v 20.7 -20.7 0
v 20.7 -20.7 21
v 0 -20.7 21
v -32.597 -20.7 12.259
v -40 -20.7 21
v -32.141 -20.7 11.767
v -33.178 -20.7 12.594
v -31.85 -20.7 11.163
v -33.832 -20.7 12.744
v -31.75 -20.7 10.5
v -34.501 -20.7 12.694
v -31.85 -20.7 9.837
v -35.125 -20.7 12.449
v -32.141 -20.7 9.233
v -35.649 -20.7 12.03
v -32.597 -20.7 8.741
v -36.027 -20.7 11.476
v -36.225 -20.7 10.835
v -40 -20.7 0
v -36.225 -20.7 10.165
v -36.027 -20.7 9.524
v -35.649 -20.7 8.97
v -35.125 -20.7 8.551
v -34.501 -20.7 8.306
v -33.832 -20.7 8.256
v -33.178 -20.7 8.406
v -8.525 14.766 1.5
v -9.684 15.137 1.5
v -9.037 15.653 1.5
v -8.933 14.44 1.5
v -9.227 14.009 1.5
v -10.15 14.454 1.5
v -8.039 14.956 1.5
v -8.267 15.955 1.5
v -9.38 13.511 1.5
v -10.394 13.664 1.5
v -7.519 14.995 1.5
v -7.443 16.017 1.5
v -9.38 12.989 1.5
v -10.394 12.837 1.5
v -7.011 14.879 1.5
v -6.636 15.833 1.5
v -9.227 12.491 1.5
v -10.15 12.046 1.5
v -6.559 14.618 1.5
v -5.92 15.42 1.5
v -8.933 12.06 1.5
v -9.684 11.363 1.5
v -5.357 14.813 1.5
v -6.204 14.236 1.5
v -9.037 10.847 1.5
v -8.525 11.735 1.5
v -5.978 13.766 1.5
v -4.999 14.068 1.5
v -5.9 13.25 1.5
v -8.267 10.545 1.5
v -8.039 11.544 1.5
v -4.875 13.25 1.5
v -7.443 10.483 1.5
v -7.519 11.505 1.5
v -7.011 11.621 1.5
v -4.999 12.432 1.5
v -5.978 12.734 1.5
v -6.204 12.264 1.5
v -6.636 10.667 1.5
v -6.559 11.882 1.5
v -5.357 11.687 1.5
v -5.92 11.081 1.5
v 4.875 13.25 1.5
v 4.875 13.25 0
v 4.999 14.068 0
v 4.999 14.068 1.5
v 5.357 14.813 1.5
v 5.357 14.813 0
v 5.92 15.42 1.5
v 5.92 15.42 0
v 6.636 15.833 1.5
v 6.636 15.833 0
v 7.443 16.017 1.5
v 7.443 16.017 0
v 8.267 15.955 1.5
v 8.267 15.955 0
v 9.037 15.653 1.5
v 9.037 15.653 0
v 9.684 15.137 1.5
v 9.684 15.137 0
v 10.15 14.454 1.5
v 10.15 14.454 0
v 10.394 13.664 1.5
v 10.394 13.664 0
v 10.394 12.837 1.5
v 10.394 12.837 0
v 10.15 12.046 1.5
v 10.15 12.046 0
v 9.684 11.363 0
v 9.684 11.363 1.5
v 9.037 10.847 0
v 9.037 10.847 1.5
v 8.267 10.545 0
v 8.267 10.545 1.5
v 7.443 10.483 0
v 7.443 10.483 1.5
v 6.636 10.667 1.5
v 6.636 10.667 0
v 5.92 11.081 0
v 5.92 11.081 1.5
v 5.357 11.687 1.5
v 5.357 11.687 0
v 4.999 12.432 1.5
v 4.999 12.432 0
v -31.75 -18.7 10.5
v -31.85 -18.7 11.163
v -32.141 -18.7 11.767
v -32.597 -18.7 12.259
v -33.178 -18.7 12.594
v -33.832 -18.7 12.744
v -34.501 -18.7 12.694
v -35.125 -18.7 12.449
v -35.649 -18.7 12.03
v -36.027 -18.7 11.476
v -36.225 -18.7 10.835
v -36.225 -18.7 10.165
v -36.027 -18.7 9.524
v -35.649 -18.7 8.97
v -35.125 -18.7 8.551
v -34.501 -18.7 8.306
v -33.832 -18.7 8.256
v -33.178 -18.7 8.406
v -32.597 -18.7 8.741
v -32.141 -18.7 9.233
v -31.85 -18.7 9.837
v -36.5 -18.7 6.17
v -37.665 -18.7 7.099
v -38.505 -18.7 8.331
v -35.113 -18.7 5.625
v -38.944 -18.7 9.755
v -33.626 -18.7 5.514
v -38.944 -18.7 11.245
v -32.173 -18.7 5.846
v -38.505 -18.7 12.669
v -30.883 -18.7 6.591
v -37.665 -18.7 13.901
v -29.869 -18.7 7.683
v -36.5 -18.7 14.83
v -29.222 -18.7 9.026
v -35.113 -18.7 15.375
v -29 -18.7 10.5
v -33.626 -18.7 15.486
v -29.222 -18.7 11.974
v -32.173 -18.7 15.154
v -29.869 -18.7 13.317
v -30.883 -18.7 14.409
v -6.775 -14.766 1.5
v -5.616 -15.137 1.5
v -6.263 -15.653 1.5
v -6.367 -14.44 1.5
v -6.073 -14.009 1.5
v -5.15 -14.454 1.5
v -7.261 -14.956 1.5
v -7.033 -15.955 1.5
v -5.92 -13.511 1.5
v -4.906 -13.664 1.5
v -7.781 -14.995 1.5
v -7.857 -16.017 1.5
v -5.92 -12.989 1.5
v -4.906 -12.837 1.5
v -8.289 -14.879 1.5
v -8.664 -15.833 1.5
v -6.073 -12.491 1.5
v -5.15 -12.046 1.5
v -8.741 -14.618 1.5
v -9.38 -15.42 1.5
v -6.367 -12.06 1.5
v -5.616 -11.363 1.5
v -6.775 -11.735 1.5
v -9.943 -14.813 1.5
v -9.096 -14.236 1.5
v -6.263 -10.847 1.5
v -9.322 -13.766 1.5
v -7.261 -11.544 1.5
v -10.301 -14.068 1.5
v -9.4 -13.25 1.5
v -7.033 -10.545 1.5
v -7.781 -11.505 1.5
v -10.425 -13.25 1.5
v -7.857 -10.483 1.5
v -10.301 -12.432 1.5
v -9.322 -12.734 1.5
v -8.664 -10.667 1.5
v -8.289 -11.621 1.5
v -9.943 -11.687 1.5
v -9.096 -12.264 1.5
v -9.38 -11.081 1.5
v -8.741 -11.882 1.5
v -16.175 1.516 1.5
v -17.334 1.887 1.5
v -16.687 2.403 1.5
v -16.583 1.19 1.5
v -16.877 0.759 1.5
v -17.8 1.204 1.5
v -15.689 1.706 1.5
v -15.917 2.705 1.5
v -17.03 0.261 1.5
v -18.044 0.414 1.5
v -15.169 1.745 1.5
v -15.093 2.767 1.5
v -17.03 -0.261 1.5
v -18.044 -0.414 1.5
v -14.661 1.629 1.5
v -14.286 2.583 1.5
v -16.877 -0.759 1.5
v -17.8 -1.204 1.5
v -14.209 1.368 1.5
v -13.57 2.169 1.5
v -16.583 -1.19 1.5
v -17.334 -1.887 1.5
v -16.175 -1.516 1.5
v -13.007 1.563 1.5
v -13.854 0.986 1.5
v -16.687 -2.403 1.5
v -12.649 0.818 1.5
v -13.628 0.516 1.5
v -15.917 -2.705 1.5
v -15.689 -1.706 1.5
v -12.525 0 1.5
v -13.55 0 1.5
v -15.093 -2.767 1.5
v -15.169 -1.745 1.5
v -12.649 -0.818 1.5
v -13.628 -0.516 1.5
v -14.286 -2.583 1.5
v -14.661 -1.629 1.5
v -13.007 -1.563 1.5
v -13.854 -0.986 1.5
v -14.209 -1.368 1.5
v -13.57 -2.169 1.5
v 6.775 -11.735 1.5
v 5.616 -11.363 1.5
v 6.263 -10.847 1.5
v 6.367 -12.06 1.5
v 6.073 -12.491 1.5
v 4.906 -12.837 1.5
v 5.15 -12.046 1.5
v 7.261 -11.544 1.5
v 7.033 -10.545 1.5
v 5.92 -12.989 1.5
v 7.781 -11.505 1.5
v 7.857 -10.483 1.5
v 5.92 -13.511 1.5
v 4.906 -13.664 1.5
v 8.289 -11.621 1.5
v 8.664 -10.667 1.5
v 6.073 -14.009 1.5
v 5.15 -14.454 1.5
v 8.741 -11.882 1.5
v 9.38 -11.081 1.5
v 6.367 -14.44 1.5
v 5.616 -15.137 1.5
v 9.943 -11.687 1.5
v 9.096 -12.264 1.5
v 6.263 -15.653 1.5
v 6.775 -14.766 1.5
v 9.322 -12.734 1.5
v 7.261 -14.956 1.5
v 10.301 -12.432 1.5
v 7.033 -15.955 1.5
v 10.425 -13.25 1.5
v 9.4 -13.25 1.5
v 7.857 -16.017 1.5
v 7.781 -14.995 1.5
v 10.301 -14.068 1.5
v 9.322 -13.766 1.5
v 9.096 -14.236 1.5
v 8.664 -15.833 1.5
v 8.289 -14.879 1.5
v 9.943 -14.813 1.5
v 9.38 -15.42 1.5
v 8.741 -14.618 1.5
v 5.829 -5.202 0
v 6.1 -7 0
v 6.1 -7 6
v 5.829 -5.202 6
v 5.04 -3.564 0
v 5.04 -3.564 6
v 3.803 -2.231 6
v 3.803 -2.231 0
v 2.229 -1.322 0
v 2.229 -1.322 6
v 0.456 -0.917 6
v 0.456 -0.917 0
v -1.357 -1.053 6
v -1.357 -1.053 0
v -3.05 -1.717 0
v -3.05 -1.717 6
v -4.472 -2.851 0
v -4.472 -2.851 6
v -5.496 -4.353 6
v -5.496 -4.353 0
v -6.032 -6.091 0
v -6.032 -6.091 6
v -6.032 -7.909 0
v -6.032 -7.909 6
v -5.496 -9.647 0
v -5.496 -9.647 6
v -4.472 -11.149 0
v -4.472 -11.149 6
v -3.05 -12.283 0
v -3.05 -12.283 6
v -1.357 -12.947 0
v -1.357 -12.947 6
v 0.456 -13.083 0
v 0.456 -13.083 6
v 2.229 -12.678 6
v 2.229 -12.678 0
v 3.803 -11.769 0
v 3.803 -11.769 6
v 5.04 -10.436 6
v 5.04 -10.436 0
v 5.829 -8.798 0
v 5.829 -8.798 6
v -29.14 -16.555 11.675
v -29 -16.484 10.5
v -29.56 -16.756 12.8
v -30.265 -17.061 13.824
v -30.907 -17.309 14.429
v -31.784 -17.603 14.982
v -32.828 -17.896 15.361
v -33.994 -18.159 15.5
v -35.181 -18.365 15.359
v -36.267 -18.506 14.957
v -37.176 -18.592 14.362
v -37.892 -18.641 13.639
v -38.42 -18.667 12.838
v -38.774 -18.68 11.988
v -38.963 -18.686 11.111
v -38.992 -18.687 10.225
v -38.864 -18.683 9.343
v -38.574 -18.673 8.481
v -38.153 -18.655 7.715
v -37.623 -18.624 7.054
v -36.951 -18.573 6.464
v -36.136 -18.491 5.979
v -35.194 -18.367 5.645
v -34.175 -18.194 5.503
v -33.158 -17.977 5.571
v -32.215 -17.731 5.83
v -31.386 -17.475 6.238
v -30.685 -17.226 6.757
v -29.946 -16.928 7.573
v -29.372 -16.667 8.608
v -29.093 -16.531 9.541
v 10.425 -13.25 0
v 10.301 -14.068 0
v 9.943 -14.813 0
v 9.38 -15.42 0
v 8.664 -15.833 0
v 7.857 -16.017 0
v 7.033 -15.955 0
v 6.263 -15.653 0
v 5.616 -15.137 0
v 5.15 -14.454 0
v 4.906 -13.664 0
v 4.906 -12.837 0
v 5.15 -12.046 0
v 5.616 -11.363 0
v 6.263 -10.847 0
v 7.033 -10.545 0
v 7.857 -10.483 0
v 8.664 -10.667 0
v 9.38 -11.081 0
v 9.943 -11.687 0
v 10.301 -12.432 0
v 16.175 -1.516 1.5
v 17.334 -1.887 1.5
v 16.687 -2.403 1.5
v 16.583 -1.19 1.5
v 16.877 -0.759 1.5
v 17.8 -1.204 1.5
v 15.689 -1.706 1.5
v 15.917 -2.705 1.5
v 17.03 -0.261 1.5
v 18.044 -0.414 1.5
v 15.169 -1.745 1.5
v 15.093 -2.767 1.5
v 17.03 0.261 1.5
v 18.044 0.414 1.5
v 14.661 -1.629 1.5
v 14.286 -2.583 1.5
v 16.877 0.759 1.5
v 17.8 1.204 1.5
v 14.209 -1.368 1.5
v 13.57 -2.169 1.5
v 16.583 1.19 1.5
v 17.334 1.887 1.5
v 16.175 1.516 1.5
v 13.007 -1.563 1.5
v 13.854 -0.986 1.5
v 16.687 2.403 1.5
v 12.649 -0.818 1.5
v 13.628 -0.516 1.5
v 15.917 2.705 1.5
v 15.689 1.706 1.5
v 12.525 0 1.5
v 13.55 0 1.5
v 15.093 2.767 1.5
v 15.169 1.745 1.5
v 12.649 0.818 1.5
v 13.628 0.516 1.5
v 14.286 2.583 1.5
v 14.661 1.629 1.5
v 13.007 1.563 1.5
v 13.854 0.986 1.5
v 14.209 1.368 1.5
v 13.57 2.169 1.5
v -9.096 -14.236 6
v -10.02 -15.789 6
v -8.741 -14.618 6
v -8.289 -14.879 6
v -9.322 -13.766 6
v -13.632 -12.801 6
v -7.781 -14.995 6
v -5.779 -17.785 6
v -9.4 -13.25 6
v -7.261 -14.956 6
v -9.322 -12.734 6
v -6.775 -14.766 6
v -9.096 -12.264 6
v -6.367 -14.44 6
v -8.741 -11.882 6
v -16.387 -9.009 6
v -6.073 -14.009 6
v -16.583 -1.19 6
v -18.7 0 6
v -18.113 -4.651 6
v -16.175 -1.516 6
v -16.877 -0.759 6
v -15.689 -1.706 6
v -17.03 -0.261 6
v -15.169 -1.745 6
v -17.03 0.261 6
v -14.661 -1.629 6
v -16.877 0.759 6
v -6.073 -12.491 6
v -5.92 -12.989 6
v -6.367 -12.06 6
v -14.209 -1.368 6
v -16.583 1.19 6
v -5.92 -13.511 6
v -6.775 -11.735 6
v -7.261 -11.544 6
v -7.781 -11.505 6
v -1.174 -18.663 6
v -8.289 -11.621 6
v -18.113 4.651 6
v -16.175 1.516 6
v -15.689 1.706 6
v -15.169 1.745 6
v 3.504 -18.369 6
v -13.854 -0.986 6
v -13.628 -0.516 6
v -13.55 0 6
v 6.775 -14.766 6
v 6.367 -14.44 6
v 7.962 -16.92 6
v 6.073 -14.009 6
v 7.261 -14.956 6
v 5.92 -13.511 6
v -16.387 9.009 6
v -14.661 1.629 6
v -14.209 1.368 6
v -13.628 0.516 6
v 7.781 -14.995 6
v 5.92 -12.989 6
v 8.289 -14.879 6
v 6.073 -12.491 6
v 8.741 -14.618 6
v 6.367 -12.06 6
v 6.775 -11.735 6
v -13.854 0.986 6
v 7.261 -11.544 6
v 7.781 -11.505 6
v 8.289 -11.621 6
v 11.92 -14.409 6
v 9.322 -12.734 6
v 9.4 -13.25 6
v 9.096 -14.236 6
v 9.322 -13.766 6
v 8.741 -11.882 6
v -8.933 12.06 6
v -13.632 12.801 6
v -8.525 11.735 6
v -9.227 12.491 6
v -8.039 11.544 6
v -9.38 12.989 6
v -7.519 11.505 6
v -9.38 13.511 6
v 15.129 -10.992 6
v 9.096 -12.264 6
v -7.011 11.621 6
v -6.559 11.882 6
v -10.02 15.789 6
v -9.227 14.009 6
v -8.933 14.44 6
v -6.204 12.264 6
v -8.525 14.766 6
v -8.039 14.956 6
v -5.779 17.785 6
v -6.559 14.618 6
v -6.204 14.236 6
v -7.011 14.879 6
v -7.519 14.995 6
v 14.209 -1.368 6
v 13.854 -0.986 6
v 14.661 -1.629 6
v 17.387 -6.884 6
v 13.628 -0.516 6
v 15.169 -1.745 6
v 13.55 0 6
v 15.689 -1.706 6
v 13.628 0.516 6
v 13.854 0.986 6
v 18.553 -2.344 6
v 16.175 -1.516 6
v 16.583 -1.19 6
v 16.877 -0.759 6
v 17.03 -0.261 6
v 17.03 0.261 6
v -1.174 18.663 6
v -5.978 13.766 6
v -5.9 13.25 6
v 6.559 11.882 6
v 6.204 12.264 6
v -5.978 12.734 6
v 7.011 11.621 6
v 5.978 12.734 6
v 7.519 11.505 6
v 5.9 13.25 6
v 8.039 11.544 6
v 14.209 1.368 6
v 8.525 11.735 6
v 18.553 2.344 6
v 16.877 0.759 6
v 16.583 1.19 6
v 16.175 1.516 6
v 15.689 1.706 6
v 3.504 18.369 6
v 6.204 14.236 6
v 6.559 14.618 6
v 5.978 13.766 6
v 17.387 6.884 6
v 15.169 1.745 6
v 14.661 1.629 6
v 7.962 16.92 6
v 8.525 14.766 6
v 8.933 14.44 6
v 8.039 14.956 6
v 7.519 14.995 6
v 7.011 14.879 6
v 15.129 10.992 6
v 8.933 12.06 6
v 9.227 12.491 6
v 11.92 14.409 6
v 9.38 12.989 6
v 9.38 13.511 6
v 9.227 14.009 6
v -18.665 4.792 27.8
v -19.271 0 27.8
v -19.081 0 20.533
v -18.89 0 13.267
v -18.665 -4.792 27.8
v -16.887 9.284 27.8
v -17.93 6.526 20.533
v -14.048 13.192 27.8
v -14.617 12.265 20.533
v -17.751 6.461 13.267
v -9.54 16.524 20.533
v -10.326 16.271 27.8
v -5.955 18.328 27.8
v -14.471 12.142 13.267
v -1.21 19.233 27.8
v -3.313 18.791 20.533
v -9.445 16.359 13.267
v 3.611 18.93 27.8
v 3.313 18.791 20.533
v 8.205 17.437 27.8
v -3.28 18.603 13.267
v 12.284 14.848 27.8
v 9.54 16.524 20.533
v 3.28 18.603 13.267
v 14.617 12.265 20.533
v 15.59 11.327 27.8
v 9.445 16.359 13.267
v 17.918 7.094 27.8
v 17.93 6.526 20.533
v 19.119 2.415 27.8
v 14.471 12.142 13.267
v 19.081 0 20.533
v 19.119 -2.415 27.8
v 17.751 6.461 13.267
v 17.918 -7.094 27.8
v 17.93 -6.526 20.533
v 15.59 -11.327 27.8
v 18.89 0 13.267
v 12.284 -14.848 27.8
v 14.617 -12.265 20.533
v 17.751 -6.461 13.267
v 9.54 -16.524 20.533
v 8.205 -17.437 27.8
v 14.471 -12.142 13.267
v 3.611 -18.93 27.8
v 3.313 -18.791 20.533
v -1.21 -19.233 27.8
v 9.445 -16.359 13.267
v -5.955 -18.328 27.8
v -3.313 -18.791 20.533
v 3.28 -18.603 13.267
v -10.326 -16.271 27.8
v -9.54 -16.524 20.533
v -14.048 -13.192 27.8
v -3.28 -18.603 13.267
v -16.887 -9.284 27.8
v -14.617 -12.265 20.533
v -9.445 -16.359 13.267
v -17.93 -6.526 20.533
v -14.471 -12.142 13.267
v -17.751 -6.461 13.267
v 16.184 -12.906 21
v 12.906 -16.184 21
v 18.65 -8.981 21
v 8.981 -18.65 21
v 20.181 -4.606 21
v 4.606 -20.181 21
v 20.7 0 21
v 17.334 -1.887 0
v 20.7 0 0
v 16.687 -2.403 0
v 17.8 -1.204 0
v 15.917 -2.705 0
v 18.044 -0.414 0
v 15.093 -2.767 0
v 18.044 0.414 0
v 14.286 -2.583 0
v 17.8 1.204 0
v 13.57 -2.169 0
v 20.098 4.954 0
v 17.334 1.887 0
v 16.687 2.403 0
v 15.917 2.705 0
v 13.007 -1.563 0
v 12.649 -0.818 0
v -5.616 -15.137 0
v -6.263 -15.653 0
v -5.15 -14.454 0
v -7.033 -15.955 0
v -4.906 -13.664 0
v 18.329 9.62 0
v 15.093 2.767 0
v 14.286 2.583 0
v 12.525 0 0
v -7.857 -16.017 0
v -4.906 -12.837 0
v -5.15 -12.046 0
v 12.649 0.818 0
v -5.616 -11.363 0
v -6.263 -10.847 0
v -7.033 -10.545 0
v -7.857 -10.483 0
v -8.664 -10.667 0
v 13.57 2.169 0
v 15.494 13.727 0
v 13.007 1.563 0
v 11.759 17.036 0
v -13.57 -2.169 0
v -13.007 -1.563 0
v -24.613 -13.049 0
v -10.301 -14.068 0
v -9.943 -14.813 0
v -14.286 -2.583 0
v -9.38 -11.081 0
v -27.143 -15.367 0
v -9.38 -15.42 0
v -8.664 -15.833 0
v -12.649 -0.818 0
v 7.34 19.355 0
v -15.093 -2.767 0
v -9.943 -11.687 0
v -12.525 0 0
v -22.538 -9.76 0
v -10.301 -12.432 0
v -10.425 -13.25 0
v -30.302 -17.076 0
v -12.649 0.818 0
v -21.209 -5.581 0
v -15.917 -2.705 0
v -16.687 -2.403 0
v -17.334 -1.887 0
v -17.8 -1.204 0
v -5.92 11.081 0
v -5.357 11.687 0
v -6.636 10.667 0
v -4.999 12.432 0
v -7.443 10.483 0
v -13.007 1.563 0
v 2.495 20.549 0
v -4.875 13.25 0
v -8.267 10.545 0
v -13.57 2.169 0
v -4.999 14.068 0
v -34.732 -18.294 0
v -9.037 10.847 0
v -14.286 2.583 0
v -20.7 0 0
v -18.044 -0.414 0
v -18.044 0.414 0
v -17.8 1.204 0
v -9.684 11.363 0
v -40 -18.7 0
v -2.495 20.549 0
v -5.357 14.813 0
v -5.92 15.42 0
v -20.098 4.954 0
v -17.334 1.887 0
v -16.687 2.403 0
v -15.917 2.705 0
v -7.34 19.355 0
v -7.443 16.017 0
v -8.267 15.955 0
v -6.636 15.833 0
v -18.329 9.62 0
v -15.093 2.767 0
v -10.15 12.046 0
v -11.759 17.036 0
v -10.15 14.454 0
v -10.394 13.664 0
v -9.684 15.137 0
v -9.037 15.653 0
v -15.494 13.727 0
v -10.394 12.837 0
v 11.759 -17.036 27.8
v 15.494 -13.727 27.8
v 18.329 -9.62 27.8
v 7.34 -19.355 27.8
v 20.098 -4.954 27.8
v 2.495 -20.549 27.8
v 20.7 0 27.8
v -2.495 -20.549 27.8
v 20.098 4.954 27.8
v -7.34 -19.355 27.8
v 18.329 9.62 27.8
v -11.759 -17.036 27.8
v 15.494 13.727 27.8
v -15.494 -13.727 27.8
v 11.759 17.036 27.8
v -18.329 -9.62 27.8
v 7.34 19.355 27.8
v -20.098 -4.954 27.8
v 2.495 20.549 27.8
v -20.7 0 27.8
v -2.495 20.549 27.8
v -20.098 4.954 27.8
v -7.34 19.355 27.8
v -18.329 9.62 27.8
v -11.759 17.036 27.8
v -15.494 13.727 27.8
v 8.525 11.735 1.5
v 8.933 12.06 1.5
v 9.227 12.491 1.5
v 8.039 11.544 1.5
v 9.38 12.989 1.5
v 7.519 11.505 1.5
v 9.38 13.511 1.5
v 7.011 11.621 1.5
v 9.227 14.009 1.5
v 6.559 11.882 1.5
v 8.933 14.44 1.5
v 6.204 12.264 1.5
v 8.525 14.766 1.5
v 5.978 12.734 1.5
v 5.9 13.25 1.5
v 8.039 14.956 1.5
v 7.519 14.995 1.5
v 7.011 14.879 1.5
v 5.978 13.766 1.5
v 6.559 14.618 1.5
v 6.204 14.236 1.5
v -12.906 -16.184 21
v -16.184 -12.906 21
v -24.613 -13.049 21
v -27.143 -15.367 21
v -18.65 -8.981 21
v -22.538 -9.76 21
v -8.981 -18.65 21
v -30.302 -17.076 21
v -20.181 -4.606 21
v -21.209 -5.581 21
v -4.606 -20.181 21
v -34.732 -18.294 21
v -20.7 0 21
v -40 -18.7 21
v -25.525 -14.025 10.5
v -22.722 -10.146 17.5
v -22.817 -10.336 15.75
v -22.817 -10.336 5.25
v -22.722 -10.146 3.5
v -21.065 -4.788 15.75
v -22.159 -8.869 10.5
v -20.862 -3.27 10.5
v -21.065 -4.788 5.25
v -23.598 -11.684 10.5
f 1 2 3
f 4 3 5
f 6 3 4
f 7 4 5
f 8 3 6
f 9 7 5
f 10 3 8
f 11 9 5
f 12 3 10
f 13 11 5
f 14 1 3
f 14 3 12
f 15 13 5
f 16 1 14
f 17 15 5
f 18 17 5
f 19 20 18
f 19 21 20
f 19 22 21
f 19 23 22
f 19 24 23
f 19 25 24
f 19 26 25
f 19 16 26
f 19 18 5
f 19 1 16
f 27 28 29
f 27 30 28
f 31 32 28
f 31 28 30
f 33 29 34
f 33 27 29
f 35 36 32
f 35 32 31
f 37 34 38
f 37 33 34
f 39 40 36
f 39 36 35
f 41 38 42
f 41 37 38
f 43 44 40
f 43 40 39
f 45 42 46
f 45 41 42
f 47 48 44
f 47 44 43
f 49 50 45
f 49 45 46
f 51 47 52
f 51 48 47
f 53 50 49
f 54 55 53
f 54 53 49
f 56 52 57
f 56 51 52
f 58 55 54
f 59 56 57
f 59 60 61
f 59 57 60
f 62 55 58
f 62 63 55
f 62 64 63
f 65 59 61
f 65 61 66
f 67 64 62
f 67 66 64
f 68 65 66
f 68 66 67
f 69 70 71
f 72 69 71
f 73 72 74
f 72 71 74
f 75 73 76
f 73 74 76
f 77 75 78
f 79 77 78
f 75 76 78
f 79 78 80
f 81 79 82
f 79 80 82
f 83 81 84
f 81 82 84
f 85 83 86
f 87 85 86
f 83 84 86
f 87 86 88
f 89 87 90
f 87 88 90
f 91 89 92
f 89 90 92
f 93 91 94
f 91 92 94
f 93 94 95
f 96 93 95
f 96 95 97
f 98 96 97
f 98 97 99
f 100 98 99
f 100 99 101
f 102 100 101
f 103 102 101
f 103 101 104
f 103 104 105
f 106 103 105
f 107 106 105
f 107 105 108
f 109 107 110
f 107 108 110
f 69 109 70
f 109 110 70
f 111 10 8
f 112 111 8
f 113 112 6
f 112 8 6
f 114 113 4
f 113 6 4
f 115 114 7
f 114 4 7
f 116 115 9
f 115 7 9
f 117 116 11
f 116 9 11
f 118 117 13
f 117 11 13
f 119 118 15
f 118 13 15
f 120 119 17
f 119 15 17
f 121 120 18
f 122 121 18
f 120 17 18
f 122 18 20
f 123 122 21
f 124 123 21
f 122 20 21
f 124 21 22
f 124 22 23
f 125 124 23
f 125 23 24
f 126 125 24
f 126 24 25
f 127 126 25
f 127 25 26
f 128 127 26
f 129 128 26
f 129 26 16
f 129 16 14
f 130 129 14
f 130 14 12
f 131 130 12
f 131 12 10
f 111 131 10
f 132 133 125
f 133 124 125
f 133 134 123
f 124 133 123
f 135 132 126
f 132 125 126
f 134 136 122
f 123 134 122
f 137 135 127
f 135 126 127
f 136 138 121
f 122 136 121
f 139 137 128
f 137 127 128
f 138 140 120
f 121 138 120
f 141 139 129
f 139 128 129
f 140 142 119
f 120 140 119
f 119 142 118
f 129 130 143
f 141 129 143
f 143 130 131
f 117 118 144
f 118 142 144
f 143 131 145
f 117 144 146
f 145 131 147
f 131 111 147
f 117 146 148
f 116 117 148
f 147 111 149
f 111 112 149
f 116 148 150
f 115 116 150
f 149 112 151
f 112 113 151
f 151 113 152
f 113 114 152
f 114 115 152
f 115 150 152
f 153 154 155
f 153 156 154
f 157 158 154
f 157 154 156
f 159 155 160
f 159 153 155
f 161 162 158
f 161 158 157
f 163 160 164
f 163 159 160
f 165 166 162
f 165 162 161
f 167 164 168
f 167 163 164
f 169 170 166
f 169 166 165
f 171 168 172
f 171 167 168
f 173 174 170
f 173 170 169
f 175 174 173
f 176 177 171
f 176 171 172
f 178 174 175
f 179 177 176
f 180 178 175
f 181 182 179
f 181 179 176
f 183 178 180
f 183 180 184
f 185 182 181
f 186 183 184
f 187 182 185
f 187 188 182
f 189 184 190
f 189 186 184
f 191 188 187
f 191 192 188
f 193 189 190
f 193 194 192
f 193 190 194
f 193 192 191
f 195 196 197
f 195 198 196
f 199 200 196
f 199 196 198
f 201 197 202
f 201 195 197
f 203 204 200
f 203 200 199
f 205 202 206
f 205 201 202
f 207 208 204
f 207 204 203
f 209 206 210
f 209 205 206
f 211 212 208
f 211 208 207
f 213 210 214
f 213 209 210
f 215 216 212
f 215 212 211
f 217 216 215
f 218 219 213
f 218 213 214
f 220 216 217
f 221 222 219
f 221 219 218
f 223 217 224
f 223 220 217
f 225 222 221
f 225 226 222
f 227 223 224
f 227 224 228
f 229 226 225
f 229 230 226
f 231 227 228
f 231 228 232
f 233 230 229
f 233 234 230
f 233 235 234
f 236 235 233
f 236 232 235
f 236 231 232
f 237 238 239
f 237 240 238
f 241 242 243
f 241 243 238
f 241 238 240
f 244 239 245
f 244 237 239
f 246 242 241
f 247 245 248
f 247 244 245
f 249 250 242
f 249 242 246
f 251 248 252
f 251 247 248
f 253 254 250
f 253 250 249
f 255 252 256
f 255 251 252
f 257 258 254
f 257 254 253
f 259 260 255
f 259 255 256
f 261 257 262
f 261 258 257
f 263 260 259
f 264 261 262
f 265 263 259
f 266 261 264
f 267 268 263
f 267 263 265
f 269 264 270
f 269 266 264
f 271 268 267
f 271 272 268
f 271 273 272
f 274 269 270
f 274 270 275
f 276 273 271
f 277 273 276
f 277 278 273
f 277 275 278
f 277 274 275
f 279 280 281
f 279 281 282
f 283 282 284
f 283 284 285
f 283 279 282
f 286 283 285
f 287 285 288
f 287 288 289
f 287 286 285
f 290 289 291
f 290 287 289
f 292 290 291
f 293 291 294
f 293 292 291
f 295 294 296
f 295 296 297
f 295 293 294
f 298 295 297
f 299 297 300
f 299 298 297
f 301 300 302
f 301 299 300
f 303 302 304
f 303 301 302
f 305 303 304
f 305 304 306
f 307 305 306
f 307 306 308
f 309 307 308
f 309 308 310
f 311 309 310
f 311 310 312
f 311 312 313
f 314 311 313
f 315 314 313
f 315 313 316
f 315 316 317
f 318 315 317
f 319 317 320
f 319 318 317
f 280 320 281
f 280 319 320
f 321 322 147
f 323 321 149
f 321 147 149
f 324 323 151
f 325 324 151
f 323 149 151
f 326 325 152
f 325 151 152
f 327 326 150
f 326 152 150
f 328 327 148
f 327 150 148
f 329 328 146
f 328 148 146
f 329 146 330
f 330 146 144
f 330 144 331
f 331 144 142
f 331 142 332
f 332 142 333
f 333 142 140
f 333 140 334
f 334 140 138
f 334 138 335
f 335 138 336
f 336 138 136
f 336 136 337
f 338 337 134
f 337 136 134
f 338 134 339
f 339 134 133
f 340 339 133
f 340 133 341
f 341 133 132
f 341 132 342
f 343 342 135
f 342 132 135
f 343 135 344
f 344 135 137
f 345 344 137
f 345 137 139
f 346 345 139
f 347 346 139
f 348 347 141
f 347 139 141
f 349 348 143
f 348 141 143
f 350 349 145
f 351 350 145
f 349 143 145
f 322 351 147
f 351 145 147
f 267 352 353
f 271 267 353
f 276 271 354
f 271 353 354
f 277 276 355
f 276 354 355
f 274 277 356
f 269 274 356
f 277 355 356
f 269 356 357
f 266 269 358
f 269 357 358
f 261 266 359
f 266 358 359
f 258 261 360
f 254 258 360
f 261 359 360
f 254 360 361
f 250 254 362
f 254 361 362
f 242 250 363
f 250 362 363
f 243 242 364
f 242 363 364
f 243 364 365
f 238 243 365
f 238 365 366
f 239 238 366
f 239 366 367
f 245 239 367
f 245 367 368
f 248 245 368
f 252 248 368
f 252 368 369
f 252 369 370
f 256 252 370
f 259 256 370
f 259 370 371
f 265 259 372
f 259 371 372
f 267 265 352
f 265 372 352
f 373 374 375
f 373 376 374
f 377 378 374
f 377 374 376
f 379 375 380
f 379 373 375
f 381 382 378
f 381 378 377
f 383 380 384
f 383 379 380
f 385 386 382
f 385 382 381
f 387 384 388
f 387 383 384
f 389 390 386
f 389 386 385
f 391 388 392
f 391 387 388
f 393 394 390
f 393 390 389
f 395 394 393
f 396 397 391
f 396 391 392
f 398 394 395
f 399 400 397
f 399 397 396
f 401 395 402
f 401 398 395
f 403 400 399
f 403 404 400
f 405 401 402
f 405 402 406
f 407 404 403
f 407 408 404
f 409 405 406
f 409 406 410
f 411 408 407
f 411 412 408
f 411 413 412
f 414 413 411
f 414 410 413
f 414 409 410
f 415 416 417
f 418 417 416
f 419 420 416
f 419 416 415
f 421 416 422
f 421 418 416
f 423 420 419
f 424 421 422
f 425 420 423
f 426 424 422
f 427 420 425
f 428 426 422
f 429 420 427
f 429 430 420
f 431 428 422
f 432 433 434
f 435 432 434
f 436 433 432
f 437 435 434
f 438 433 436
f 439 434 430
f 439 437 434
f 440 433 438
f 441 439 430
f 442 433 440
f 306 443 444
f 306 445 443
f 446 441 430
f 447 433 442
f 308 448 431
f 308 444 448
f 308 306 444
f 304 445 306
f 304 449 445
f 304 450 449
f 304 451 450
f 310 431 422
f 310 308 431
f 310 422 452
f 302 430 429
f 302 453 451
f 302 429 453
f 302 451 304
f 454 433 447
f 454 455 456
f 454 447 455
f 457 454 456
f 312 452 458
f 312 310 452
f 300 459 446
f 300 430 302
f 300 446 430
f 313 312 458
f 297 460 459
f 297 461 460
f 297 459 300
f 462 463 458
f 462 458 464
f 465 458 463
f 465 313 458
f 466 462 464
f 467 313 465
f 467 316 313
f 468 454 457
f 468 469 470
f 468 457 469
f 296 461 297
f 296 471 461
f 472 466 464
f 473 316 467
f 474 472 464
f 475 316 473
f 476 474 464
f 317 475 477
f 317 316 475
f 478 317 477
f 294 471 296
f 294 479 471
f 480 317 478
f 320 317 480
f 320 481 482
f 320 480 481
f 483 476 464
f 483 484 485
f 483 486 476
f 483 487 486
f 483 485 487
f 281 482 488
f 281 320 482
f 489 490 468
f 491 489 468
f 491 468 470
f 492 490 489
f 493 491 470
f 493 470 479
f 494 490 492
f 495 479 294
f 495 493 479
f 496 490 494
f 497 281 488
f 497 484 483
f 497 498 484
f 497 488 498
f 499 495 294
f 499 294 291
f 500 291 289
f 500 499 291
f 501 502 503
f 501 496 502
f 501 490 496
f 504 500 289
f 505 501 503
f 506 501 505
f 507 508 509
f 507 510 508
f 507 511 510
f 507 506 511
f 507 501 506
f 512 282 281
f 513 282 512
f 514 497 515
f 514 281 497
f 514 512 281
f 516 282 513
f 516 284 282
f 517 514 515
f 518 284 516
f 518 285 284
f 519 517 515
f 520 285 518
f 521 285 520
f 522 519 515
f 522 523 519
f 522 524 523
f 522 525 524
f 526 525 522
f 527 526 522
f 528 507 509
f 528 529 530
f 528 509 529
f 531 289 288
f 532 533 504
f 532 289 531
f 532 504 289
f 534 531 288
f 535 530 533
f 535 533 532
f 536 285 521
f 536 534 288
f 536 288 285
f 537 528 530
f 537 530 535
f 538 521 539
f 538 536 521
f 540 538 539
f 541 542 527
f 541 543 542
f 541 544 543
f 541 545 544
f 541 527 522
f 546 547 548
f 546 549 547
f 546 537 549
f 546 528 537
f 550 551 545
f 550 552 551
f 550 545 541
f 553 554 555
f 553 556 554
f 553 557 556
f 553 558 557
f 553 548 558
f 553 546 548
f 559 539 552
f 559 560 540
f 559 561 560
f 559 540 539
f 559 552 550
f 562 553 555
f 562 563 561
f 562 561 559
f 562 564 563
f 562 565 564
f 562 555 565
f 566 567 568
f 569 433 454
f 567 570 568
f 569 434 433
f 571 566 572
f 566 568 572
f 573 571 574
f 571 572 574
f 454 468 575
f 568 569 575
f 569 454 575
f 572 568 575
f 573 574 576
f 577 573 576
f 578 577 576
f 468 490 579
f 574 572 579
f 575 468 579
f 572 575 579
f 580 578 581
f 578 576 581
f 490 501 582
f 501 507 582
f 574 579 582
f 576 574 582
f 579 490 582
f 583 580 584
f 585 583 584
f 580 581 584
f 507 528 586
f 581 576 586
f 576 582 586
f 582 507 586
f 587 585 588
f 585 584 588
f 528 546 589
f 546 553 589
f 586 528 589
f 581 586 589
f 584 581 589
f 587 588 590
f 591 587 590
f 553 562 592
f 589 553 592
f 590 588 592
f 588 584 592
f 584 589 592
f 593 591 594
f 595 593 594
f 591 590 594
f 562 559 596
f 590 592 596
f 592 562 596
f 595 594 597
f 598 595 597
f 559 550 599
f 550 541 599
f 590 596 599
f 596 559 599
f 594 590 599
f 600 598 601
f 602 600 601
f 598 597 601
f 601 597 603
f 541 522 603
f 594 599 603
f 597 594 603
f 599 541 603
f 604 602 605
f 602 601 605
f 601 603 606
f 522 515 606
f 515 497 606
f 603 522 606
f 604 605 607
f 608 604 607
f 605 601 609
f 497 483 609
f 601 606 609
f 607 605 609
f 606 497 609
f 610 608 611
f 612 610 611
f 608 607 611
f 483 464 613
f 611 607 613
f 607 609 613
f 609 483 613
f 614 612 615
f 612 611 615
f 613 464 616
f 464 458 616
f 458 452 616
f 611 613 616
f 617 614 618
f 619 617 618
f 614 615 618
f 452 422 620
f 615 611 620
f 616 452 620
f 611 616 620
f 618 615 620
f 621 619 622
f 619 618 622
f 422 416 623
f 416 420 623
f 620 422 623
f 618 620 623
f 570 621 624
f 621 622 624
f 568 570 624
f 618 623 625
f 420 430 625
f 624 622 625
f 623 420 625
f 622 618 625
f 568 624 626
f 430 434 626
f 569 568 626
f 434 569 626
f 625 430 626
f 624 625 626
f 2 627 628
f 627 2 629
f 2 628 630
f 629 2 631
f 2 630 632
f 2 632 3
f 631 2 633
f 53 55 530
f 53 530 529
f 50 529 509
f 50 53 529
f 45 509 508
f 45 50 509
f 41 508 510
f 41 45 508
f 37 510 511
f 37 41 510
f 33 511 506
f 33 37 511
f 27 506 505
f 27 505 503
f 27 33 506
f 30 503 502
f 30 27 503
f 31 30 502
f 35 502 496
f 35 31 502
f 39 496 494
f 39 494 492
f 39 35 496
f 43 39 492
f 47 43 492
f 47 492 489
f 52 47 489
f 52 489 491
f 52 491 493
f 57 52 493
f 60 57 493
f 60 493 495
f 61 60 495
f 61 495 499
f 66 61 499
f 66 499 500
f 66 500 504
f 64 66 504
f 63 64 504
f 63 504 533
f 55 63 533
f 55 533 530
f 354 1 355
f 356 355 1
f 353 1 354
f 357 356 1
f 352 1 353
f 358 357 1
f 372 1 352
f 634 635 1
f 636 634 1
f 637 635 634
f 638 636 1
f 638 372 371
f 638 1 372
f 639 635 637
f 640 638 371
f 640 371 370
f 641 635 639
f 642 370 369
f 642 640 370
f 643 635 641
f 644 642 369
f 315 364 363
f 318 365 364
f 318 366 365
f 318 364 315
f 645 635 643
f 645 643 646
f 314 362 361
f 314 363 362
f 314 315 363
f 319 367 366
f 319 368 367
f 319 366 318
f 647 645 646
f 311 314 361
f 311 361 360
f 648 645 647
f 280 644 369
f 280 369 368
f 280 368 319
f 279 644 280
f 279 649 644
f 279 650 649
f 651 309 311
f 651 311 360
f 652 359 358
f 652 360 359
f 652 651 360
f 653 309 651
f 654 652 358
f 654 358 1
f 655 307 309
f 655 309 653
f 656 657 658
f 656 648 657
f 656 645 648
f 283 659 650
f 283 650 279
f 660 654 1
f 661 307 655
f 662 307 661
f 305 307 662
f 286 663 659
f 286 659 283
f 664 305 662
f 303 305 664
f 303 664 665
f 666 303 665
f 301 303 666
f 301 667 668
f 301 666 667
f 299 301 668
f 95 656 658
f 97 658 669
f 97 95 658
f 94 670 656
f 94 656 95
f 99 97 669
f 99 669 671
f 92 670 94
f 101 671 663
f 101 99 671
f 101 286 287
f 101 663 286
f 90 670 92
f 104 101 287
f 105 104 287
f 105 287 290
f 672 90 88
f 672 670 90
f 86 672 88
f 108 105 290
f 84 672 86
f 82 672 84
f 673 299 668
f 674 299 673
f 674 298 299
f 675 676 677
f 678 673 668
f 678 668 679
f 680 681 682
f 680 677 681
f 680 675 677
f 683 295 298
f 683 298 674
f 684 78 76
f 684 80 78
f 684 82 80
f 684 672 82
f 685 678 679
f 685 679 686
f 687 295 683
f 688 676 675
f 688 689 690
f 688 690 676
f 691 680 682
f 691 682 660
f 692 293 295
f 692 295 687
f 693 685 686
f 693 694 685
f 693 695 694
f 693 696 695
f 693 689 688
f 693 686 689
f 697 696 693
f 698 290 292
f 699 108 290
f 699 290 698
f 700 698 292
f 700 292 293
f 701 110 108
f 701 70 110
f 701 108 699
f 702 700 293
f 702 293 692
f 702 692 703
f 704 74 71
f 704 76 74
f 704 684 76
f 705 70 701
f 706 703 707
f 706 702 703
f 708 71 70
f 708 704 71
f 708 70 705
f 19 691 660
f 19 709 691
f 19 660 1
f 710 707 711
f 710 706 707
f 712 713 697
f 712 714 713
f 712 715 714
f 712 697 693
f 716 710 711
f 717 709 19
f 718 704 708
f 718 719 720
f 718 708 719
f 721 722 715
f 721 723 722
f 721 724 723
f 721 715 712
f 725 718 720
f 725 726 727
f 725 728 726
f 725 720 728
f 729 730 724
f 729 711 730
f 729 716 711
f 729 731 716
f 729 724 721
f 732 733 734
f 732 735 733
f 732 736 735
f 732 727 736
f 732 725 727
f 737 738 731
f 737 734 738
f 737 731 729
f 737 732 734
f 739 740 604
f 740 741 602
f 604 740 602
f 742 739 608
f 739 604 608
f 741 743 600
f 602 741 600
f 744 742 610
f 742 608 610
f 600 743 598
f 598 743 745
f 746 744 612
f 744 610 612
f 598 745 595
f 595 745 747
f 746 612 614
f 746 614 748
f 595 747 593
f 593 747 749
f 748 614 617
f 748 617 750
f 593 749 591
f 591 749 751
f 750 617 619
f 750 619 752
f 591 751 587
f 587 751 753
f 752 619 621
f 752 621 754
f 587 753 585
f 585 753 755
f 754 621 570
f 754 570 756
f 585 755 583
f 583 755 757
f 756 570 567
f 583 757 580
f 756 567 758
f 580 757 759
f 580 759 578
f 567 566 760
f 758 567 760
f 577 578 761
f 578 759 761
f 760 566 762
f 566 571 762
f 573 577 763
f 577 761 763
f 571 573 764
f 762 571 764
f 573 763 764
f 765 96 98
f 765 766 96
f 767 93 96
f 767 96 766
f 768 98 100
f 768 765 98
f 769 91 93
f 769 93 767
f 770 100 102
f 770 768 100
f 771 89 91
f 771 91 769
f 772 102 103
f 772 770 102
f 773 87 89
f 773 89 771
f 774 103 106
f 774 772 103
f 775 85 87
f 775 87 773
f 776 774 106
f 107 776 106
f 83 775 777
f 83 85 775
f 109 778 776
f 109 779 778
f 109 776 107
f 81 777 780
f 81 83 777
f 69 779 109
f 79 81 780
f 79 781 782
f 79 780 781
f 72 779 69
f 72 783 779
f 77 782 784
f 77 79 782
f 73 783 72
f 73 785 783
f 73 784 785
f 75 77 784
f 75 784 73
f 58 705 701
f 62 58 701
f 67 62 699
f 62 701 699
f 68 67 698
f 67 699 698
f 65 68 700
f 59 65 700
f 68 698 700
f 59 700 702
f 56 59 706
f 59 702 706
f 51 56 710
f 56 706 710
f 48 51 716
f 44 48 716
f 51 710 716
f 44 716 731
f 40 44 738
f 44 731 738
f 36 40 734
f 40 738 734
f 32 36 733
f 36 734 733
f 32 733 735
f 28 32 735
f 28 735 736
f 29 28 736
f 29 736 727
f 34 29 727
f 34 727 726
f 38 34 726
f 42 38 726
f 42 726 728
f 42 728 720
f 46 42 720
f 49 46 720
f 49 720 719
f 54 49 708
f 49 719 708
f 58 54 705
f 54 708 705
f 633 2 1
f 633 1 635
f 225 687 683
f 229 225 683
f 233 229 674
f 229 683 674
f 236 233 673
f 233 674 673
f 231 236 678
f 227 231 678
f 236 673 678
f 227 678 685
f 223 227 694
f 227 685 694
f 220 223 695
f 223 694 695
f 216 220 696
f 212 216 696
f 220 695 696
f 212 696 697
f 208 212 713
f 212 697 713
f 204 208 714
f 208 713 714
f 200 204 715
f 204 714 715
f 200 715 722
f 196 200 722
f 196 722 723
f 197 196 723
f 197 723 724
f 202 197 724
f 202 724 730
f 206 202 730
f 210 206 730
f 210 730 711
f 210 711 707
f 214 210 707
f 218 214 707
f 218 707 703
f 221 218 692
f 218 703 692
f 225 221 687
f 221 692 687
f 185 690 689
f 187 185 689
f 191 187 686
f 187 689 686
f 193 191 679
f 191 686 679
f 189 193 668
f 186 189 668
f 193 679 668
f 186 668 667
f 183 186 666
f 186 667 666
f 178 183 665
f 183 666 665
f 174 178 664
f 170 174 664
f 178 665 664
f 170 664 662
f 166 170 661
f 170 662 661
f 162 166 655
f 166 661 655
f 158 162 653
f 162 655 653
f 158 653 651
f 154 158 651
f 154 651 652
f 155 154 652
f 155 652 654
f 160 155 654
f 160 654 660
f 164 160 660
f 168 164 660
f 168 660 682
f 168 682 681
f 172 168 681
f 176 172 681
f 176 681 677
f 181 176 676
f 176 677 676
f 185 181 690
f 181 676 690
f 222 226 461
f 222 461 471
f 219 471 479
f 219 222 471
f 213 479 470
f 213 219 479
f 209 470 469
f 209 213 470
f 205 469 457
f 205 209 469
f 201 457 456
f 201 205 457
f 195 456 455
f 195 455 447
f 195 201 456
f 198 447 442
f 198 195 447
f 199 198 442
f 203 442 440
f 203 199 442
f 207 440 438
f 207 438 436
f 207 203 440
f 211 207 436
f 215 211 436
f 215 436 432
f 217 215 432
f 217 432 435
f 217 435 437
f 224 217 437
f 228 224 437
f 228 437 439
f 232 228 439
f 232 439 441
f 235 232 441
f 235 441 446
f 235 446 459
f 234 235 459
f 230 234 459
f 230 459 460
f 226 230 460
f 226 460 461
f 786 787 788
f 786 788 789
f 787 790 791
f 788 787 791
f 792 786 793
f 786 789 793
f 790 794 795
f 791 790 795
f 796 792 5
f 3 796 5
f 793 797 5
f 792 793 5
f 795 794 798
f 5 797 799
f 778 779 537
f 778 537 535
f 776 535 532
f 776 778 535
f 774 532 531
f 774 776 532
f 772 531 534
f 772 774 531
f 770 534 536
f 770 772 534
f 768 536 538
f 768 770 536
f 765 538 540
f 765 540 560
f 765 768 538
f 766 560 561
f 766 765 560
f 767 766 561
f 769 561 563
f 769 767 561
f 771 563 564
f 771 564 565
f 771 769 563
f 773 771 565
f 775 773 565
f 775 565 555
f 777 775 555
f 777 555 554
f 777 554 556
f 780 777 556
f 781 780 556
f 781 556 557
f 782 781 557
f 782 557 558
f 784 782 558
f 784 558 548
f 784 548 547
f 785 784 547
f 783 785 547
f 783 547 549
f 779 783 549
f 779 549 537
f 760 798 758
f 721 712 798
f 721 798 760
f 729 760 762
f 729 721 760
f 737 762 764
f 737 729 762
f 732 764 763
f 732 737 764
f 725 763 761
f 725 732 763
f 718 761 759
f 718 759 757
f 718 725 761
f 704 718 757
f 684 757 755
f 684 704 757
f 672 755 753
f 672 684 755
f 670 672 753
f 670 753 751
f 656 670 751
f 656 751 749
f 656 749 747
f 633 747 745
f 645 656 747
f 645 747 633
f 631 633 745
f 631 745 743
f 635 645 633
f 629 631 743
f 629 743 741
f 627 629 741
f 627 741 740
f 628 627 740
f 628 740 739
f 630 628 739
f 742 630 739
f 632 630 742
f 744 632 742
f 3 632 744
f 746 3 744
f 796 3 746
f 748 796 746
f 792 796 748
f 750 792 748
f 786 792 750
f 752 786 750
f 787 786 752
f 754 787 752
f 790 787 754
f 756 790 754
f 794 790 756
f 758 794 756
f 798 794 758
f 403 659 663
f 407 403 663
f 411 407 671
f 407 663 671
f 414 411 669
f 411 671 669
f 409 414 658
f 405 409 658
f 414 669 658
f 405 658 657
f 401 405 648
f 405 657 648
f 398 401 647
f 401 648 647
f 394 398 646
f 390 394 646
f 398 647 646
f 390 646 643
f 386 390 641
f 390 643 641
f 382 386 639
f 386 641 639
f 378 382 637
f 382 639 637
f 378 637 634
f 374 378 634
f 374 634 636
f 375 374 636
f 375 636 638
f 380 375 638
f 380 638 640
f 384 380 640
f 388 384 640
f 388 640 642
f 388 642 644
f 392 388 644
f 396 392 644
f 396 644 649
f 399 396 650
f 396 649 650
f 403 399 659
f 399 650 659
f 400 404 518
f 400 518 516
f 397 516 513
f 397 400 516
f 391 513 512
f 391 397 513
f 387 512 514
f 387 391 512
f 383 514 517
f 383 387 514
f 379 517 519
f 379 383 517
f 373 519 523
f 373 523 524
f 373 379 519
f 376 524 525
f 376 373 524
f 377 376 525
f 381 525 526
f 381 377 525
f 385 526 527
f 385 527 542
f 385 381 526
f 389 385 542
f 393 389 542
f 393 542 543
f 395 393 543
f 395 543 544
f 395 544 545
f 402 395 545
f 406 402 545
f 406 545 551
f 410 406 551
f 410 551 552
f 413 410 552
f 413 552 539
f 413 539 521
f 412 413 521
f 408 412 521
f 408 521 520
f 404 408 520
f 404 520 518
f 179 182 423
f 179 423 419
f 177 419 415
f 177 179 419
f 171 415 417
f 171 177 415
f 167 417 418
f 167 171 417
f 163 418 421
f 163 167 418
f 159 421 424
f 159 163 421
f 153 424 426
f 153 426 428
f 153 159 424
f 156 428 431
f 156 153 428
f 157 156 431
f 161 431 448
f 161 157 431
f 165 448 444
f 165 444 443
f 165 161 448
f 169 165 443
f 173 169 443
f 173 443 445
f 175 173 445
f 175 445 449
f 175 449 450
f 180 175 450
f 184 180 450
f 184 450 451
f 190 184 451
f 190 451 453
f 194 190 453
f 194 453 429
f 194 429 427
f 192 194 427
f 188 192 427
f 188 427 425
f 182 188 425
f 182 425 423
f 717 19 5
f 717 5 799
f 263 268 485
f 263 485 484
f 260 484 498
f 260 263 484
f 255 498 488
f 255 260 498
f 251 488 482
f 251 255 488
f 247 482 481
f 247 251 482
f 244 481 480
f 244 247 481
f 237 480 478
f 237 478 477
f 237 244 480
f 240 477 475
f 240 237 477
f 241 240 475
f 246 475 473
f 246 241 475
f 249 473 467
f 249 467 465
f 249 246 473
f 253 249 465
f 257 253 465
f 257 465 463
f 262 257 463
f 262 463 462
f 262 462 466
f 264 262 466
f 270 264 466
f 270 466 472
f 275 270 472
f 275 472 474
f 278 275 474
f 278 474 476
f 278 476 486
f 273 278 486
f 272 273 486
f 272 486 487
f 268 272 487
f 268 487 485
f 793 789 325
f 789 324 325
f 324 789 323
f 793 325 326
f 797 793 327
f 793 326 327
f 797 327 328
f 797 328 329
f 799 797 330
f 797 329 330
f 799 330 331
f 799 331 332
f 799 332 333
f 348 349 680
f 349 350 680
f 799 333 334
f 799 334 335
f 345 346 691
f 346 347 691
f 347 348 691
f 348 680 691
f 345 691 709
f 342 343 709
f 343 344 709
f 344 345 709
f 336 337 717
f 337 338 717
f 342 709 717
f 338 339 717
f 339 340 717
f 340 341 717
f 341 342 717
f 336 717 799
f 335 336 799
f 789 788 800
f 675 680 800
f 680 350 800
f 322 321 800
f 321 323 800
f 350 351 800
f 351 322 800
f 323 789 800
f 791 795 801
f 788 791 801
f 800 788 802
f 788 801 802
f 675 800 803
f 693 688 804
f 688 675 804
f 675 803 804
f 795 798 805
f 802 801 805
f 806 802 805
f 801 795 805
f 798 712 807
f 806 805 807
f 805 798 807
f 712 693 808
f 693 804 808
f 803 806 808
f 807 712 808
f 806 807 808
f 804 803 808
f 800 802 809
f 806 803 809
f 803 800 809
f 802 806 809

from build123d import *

# Parameters (mm, degrees)
SKIZZE1_R                       = 18.7
SKIZZE1_R_2                     = 6.1
SKIZZE1_R_3                     = 1.75
AUFSATZ_LINEAR_AUSTRAGEN1_DEPTH = 6
SKIZZE3_R                       = 20.7
SKIZZE3_R_2                     = 18.7
AUFSATZ_LINEAR_AUSTRAGEN2_DEPTH = 27.8
AUFSATZ_LINEAR_AUSTRAGEN3_DEPTH = 21
SKIZZE7_R                       = 2.25
SCHNITT_LINEAR_AUSTRAGEN1_DEPTH = 64.928084722
SKIZZE8_R                       = 5
SCHNITT_LINEAR_AUSTRAGEN2_DEPTH = 10.5
FORMSCHR_GE1_ANGLE              = 1.5
SKIZZE9_R                       = 2.774707021
SKIZZE9_R_2                     = 1.75
SCHNITT_LINEAR_AUSTRAGEN3_DEPTH = 1.5
SKIZZE10_W                      = 19.3
SKIZZE10_H                      = 20.7
SCHNITT_LINEAR_AUSTRAGEN4_DEPTH = 50.69396358


with BuildPart() as part:
    # Skizze1 → Aufsatz-Linear austragen1 (new body)
    with BuildSketch(Plane.XY):
        Circle(SKIZZE1_R)
        with Locations((0, -7)):
            Circle(SKIZZE1_R_2, mode=Mode.SUBTRACT)
        with Locations((-7.65, 13.250188678)):
            Circle(SKIZZE1_R_3, mode=Mode.SUBTRACT)
        with Locations((7.65, 13.250188678)):
            Circle(SKIZZE1_R_3, mode=Mode.SUBTRACT)
        with Locations((-15.3, 0)):
            Circle(SKIZZE1_R_3, mode=Mode.SUBTRACT)
        with Locations((15.3, 0)):
            Circle(SKIZZE1_R_3, mode=Mode.SUBTRACT)
        with Locations((-7.65, -13.250188678)):
            Circle(SKIZZE1_R_3, mode=Mode.SUBTRACT)
        with Locations((7.65, -13.250188678)):
            Circle(SKIZZE1_R_3, mode=Mode.SUBTRACT)
    extrude(amount=AUFSATZ_LINEAR_AUSTRAGEN1_DEPTH)

    # Skizze3 → Aufsatz-Linear austragen2 (add)
    with BuildSketch(Plane(origin=(0, 0, 0), x_dir=(-1, 0, 0), z_dir=(0, 0, -1))):
        Circle(SKIZZE3_R)
        Circle(SKIZZE3_R_2, mode=Mode.SUBTRACT)
    extrude(amount=-AUFSATZ_LINEAR_AUSTRAGEN2_DEPTH)

    # Skizze4 → Aufsatz-Linear austragen3 (add)
    with BuildSketch(Plane(origin=(0, 0, 0), x_dir=(-1, 0, 0), z_dir=(0, 0, -1))):
        with BuildLine():
            add(Edge.make_bspline(
                [(-20.7, 0), (-20.7, -18.7), (-40, -18.7)],
                knots=[0, 0, 0, 1, 1, 1], degree=2))
            Line((-40, -18.7), (-40, -20.7))
            Line((-40, -20.7), (9.3e-08, -20.7))
            ThreePointArc((9.3e-08, -20.7), (-14.637110338, -14.637110404), (-20.7, 0))
        make_face()
        with BuildLine():
            ThreePointArc((20.7, 0), (14.637110404, -14.637110338), (9.3e-08, -20.7))
            Line((9.3e-08, -20.7), (40, -20.7))
            Line((40, -20.7), (40, -18.7))
            add(Edge.make_bspline(
                [(20.7, 0), (20.7, -18.7), (40, -18.7)],
                knots=[0, 0, 0, 1, 1, 1], degree=2))
        make_face()
    extrude(amount=-AUFSATZ_LINEAR_AUSTRAGEN3_DEPTH)

    # Skizze7 → Schnitt-Linear austragen1 (cut, through all)
    with BuildSketch(Plane.XZ.offset(20.7)):
        with Locations((-34, 10.5)):
            Circle(SKIZZE7_R)
        with Locations((34, 10.5)):
            Circle(SKIZZE7_R)
    extrude(amount=-SCHNITT_LINEAR_AUSTRAGEN1_DEPTH, mode=Mode.SUBTRACT)

    # Skizze8 → Schnitt-Linear austragen2 (cut)
    with BuildSketch(Plane.XZ.offset(18.7)):
        with Locations((-34, 10.5)):
            Circle(SKIZZE8_R)
        with Locations((34, 10.5)):
            Circle(SKIZZE8_R)
    extrude(amount=-SCHNITT_LINEAR_AUSTRAGEN2_DEPTH, mode=Mode.SUBTRACT)

    # Formschräge1
    formschr_ge1_faces = [part.faces().sort_by_distance(p)[0] for p in [
        (18.7, 0, 16.9),
    ]]
    draft(formschr_ge1_faces, Plane.XY.offset(6), FORMSCHR_GE1_ANGLE)

    # Skizze9 → Schnitt-Linear austragen3 (cut)
    # profile 1 of 6: a face of its own
    with BuildSketch(Plane(origin=(0, 0, 0), x_dir=(-1, 0, 0), z_dir=(0, 0, -1))):
        with Locations((-7.65, 13.250188678)):
            Circle(SKIZZE9_R)
        with Locations((-7.65, 13.250188678)):
            Circle(SKIZZE9_R_2, mode=Mode.SUBTRACT)
    # profile 2 of 6: a face of its own
    with BuildSketch(Plane(origin=(0, 0, 0), x_dir=(-1, 0, 0), z_dir=(0, 0, -1))):
        with Locations((7.65, 13.250188678)):
            Circle(SKIZZE9_R)
        with Locations((7.65, 13.250188678)):
            Circle(SKIZZE9_R_2, mode=Mode.SUBTRACT)
    # profile 3 of 6: a face of its own
    with BuildSketch(Plane(origin=(0, 0, 0), x_dir=(-1, 0, 0), z_dir=(0, 0, -1))):
        with Locations((-15.3, 0)):
            Circle(SKIZZE9_R)
        with Locations((-15.3, 0)):
            Circle(SKIZZE9_R_2, mode=Mode.SUBTRACT)
    # profile 4 of 6: a face of its own
    with BuildSketch(Plane(origin=(0, 0, 0), x_dir=(-1, 0, 0), z_dir=(0, 0, -1))):
        with Locations((15.3, 0)):
            Circle(SKIZZE9_R)
        with Locations((15.3, 0)):
            Circle(SKIZZE9_R_2, mode=Mode.SUBTRACT)
    # profile 5 of 6: a face of its own
    with BuildSketch(Plane(origin=(0, 0, 0), x_dir=(-1, 0, 0), z_dir=(0, 0, -1))):
        with Locations((7.65, -13.250188678)):
            Circle(SKIZZE9_R)
        with Locations((7.65, -13.250188678)):
            Circle(SKIZZE9_R_2, mode=Mode.SUBTRACT)
    # profile 6 of 6: a face of its own
    with BuildSketch(Plane(origin=(0, 0, 0), x_dir=(-1, 0, 0), z_dir=(0, 0, -1))):
        with Locations((-7.65, -13.250188678)):
            Circle(SKIZZE9_R)
        with Locations((-7.65, -13.250188678)):
            Circle(SKIZZE9_R_2, mode=Mode.SUBTRACT)
    extrude(amount=-SCHNITT_LINEAR_AUSTRAGEN3_DEPTH, mode=Mode.SUBTRACT)

    # Skizze10 → Schnitt-Linear austragen4 (cut, through all)
    with BuildSketch(Plane.XY.offset(21)):
        with Locations((30.35, -10.35)):
            Rectangle(SKIZZE10_W, SKIZZE10_H)
    extrude(amount=-SCHNITT_LINEAR_AUSTRAGEN4_DEPTH, mode=Mode.SUBTRACT)


solid = part.part
